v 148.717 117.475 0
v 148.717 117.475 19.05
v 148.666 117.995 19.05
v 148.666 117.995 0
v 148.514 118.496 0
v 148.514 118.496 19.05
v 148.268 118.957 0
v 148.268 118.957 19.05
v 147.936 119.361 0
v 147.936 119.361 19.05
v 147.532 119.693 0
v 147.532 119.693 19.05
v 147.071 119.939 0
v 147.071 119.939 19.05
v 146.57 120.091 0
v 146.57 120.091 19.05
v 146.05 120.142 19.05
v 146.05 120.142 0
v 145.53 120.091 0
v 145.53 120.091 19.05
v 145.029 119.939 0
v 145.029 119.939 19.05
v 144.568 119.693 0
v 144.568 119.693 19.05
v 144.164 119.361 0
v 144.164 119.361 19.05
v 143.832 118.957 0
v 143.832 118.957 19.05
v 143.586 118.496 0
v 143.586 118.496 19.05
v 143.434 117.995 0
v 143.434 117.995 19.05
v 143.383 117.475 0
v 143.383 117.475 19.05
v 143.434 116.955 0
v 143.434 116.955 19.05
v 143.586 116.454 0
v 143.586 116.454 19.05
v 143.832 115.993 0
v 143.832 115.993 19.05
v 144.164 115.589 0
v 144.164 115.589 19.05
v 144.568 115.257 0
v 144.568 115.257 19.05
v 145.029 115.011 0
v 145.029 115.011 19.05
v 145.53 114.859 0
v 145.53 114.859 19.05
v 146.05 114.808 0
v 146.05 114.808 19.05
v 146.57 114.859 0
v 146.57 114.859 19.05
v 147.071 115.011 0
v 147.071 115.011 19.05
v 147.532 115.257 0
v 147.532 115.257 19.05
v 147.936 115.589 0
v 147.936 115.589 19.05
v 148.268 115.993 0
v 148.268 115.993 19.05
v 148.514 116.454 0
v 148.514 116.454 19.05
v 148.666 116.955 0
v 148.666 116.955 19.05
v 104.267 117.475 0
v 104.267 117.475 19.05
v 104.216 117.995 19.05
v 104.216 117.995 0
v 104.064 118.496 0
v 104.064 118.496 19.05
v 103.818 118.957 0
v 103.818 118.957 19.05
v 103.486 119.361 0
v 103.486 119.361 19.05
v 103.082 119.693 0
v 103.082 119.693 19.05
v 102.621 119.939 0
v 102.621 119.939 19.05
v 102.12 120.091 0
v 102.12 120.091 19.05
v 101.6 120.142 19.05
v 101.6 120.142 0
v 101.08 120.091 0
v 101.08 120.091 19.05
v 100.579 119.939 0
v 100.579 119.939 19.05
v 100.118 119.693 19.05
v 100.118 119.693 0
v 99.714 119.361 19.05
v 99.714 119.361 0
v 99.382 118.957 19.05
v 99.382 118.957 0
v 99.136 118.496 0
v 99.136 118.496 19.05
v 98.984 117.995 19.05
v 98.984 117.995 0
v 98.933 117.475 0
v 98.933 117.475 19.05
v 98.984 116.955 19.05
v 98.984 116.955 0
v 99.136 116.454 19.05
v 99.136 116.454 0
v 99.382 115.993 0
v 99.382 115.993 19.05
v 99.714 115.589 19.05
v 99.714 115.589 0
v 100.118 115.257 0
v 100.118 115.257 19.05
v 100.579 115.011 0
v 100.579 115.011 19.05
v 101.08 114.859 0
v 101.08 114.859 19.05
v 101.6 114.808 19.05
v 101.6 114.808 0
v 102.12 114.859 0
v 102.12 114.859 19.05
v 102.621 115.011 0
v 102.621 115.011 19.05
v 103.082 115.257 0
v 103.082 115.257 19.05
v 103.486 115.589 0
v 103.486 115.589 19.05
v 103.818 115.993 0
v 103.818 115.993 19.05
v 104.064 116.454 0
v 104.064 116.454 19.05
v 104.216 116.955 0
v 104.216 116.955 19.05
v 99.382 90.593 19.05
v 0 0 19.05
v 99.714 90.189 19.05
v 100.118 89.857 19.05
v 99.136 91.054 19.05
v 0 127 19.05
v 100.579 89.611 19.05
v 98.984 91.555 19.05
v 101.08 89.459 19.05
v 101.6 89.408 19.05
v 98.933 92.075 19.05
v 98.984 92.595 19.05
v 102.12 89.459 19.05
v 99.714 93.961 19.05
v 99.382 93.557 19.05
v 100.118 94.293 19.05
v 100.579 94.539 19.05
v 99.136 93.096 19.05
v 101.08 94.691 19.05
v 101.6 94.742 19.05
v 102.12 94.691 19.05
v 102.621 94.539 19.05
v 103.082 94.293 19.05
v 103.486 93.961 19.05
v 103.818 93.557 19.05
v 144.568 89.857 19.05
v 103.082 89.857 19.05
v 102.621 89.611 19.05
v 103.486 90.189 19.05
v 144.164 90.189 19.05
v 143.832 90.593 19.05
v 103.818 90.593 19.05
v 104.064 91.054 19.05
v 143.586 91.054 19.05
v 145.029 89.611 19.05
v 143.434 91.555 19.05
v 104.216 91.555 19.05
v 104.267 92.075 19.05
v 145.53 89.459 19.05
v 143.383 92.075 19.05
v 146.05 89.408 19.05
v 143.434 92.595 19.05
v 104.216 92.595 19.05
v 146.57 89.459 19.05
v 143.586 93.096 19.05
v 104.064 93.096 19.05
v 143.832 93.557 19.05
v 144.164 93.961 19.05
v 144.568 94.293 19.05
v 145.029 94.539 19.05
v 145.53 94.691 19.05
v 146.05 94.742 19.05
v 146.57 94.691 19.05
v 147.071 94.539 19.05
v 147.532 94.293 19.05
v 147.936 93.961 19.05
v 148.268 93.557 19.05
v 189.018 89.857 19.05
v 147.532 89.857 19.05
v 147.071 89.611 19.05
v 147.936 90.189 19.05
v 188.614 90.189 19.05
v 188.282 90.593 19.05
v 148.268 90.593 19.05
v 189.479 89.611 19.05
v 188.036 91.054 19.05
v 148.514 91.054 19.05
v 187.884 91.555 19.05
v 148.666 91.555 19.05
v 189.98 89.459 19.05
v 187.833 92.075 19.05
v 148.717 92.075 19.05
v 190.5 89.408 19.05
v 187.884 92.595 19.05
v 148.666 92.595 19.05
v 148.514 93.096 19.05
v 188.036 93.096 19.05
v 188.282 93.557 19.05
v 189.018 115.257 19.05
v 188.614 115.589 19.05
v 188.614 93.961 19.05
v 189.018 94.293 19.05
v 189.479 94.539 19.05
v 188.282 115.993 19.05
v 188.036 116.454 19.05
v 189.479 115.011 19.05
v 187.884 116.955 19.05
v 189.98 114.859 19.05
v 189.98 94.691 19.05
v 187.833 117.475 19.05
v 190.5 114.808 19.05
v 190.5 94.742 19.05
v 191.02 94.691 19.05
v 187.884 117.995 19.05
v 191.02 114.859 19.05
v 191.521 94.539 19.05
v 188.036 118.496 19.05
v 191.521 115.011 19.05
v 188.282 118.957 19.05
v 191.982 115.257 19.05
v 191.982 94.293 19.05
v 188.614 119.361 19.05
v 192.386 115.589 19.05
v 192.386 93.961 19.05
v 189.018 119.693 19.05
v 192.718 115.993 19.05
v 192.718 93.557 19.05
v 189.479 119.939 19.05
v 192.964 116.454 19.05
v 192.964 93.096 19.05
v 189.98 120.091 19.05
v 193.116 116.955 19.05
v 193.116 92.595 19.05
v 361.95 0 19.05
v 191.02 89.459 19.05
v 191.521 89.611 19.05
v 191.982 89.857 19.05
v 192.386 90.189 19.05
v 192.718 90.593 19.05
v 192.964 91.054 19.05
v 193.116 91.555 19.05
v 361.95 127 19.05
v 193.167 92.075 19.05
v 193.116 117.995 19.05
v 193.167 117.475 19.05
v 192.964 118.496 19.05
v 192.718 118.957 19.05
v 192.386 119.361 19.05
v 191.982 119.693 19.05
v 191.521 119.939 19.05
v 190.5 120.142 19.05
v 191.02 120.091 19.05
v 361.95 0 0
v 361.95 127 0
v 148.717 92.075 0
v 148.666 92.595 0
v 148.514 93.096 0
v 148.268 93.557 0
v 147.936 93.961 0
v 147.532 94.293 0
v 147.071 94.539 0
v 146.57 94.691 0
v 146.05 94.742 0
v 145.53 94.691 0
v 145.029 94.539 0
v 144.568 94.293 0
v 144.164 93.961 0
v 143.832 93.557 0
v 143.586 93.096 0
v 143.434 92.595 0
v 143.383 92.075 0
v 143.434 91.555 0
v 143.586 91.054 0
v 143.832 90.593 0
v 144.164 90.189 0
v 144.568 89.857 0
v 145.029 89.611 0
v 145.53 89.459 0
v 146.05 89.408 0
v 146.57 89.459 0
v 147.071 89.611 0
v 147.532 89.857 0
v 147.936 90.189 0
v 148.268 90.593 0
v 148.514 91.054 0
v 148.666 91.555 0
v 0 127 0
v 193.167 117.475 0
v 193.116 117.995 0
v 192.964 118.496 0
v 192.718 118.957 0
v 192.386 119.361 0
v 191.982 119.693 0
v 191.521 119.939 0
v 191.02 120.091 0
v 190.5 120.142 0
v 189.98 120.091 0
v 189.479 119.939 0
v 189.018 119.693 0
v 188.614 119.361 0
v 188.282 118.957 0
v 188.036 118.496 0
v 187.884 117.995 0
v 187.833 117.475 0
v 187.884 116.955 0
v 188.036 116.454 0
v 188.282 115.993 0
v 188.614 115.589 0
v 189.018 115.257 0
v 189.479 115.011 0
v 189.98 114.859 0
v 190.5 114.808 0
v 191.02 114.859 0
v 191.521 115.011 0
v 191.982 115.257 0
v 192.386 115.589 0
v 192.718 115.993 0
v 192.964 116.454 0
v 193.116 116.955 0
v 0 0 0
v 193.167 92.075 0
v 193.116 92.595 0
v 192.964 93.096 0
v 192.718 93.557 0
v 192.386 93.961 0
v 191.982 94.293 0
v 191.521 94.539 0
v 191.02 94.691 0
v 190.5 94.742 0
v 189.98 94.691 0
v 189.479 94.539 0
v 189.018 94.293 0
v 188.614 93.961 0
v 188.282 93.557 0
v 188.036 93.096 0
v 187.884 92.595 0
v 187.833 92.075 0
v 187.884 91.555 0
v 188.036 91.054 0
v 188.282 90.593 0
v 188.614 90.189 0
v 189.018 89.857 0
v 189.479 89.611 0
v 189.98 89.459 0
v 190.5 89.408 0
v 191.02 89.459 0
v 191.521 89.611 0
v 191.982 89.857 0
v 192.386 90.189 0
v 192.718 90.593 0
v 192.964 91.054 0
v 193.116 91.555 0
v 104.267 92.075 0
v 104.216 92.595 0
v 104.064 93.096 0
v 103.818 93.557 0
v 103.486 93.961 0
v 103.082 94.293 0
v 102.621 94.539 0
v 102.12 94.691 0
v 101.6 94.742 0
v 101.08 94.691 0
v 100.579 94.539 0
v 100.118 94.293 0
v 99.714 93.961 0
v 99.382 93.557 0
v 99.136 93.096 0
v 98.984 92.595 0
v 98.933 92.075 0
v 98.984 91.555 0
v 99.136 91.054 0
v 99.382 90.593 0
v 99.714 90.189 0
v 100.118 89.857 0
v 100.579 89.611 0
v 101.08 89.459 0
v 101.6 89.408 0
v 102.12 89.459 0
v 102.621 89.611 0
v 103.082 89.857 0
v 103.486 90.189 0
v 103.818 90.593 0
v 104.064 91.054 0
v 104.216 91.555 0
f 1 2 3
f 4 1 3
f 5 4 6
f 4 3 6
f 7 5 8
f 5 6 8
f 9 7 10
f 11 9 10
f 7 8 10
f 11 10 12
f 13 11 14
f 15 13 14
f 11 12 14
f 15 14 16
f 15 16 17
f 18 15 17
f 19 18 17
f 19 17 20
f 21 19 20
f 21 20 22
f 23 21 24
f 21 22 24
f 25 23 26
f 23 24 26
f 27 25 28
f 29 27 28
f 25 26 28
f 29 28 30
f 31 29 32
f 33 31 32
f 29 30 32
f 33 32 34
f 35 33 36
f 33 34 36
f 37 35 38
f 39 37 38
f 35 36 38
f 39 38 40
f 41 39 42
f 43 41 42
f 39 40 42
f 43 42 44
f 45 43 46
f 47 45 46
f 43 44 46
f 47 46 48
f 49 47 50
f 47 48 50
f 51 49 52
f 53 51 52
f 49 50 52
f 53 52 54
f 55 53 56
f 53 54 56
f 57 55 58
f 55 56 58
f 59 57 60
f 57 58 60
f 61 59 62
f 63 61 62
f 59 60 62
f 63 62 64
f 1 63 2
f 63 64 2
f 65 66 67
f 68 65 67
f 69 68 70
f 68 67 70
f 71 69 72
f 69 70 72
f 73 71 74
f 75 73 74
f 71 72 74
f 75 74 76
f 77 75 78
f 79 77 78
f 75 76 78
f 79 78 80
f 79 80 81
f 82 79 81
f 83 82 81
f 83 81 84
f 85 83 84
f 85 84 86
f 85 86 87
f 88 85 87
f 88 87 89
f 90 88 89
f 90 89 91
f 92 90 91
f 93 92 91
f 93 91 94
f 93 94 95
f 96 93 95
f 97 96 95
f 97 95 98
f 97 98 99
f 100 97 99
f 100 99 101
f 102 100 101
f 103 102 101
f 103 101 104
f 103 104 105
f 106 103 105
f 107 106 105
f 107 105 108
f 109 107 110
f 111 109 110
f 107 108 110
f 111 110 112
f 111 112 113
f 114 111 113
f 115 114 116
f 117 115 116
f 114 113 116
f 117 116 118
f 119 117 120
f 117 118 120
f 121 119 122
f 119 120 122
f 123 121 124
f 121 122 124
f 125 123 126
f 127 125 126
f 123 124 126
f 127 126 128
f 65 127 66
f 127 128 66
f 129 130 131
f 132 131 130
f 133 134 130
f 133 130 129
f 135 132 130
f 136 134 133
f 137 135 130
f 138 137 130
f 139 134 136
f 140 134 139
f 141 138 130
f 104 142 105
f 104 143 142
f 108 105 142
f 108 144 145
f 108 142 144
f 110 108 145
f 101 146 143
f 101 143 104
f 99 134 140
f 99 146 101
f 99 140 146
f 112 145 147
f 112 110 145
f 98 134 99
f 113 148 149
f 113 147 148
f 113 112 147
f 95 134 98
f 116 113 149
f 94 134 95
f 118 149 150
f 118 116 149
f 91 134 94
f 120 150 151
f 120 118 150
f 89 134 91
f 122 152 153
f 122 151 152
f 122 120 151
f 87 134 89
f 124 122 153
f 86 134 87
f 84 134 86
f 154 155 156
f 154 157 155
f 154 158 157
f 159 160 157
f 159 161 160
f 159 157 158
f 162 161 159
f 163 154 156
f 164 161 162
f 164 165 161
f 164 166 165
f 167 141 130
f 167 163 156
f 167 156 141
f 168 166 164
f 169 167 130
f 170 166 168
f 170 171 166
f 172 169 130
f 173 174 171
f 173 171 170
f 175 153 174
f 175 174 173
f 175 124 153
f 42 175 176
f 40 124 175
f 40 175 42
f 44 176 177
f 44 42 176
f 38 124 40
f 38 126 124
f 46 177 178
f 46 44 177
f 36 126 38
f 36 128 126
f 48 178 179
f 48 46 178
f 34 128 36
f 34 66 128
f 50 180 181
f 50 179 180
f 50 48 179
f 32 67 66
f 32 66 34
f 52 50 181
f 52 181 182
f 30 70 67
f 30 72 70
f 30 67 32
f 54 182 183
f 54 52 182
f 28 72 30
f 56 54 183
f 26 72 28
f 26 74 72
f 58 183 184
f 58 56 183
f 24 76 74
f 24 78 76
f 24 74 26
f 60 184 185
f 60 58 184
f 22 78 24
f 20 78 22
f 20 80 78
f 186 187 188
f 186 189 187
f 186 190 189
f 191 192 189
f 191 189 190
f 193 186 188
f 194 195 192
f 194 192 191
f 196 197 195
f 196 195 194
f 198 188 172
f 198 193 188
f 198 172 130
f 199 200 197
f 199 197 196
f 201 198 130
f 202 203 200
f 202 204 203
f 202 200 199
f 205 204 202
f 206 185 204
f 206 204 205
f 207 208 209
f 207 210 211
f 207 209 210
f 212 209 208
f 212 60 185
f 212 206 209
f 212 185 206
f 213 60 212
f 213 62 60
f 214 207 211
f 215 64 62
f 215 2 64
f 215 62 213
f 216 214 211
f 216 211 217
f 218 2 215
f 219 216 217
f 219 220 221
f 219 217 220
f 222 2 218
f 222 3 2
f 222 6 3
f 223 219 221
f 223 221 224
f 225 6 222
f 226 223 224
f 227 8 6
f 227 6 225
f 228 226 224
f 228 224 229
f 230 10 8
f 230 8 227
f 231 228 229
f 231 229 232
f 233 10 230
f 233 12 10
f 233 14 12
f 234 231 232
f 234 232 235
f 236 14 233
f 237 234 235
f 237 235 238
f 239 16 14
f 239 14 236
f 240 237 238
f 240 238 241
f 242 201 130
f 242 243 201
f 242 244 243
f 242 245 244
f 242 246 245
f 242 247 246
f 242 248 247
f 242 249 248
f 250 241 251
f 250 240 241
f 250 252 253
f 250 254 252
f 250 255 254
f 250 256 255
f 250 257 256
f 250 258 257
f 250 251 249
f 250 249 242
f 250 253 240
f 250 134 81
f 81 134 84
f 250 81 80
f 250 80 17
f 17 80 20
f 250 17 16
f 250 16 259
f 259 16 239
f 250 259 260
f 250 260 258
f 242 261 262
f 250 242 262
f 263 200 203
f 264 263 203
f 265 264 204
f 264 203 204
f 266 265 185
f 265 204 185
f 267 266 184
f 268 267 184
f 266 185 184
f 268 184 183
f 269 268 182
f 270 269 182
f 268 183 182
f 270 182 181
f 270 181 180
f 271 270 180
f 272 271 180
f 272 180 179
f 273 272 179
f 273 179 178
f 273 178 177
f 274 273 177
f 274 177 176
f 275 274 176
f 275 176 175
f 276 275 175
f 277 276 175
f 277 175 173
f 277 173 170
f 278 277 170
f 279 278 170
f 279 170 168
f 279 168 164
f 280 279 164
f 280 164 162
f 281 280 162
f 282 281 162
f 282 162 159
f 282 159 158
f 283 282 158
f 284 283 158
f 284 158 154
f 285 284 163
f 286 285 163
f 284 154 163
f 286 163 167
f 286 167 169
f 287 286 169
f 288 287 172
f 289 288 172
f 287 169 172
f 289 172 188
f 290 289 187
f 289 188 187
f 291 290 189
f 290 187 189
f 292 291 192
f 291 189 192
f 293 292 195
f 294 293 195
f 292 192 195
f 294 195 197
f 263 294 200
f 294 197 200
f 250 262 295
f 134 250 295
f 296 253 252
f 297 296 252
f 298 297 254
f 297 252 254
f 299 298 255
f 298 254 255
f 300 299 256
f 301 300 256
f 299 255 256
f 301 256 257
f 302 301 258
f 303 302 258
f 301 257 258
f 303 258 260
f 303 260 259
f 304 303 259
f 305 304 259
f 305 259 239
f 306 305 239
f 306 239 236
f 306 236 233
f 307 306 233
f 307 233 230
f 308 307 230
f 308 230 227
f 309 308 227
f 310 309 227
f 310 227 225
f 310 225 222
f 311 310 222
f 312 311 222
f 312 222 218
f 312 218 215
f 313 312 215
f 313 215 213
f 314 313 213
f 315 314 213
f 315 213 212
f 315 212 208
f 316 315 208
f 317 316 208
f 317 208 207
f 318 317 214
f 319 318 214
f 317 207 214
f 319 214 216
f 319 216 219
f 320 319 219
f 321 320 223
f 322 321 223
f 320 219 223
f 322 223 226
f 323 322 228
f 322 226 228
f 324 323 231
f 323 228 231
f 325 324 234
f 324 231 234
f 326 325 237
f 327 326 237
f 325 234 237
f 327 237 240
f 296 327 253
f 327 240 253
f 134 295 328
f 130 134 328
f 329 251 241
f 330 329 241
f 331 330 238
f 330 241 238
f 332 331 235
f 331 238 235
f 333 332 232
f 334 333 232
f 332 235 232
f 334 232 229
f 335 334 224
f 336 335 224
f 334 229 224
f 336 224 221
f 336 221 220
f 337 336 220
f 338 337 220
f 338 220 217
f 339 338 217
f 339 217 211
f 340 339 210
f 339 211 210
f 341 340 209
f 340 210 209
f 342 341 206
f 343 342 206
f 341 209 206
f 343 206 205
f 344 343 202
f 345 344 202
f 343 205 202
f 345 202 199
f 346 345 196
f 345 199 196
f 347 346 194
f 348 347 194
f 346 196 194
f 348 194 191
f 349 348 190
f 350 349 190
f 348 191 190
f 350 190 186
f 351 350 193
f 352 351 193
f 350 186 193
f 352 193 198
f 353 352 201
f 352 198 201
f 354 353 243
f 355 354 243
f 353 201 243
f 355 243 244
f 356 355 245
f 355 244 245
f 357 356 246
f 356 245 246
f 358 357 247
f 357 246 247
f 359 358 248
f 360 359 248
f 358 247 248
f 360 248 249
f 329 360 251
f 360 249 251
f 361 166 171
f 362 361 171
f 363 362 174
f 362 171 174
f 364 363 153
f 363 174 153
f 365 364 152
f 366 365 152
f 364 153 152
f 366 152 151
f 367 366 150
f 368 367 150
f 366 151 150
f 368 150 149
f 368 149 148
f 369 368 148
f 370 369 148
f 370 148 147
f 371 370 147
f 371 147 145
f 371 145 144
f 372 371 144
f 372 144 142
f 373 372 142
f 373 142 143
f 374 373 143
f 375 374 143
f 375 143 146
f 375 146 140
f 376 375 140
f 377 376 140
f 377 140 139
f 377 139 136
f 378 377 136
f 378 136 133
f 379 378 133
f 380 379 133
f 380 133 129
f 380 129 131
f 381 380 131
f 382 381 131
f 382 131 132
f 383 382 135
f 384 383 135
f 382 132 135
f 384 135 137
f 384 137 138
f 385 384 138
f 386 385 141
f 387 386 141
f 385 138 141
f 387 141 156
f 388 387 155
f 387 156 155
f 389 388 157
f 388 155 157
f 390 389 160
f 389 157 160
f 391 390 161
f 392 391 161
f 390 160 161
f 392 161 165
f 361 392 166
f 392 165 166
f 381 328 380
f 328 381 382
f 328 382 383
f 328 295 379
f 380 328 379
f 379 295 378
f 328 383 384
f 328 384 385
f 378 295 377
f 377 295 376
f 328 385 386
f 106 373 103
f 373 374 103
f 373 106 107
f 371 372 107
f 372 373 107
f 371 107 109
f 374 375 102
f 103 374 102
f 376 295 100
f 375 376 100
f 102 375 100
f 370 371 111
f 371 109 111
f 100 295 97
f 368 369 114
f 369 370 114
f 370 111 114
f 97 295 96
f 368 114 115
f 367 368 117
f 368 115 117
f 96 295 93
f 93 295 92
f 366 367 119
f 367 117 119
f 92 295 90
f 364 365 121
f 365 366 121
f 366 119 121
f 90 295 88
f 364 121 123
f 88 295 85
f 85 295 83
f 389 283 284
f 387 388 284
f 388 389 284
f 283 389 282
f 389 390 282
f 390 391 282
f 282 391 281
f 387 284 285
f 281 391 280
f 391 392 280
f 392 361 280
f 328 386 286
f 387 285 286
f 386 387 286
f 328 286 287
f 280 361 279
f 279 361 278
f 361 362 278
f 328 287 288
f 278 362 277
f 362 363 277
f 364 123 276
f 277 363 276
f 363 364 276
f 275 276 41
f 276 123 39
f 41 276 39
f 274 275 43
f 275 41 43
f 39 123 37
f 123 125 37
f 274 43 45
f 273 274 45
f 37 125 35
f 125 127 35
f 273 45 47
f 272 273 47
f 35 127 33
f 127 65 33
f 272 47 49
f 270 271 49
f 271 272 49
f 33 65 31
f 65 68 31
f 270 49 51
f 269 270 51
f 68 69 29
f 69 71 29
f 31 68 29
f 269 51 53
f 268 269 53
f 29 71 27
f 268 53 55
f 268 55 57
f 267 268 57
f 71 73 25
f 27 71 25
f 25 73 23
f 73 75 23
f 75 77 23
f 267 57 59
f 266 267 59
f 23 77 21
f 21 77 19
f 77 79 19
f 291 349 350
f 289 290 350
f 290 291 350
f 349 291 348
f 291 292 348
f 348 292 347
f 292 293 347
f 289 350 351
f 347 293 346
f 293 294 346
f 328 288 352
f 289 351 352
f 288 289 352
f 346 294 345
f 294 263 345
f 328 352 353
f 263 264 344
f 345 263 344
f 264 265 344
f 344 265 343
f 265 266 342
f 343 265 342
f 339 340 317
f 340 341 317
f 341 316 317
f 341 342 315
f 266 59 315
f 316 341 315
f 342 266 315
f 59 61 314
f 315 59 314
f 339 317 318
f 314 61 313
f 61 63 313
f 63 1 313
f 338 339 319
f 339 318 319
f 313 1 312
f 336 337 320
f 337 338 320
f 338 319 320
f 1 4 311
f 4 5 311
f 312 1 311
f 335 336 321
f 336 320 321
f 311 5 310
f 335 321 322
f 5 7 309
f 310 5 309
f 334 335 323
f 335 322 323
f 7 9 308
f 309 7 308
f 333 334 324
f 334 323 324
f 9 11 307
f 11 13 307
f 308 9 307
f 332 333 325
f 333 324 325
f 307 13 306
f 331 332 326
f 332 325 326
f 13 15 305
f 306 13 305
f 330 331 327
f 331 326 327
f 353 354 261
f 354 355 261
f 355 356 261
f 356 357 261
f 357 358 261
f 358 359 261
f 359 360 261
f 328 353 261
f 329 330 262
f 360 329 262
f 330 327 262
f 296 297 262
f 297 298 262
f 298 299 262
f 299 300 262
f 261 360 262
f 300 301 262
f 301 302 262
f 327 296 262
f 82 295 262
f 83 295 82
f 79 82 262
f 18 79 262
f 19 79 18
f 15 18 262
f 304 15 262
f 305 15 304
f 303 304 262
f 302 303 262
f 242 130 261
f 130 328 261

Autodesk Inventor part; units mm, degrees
ref_plane "YZ Plane" through (0, 0, 0) normal (1, 0, 0) x (0, 1, 0)
ref_plane "XZ Plane" through (0, 0, 0) normal (0, 1, 0) x (-1, 0, 0)
ref_plane "XY Plane" through (0, 0, 0) normal (0, 0, 1) x (1, 0, 0)
sketch "Sketch1" plane through (0, 0, 0) normal (0, 0, 1) x (1, 0, 0)
  line L0 (0, 0) -> (361.95, 0)
  line L1 (361.95, 0) -> (361.95, 127)
  line L2 (361.95, 127) -> (0, 127)
  line L3 (0, 127) -> (0, 0)
  dimension "d0" = 361.95
  dimension "d1" = 127
extrude "Extrusion1" add sketch "Sketch1" along normal blind 19.05
sketch "Sketch2" plane through (0, 0, 19.05) normal (0, 0, 1) x (1, 0, 0)
  line L0 (361.95, 127) -> (0, 127) construction
  line L1 (0, 127) -> (101.6, 127) construction
  line L2 (101.6, 127) -> (101.6, 117.475) construction
  line L3 (101.6, 117.475) -> (146.05, 117.475) construction
  line L4 (146.05, 117.475) -> (190.5, 117.475) construction
  line L5 (190.5, 117.475) -> (190.5, 92.075) construction
  line L6 (190.5, 92.075) -> (146.05, 92.075) construction
  line L7 (146.05, 92.075) -> (101.6, 92.075) construction
  circle A0 centre (101.6, 117.475) radius 2.667
  circle A1 centre (146.05, 117.475) radius 2.667
  circle A2 centre (190.5, 117.475) radius 2.667
  circle A3 centre (190.5, 92.075) radius 2.667
  circle A4 centre (146.05, 92.075) radius 2.667
  circle A5 centre (101.6, 92.075) radius 2.667
  point P0 (0, 0)
  dimension "d4" = 101.6
  dimension "d5" = 9.525
  dimension "d6" = 44.45
  dimension "d7" = 44.45
  dimension "d8" = 25.4
  dimension "d9" = 5.334
extrude "Extrusion2" cut sketch "Sketch2" against normal blind 19.05
properties part number "Short Plank"
